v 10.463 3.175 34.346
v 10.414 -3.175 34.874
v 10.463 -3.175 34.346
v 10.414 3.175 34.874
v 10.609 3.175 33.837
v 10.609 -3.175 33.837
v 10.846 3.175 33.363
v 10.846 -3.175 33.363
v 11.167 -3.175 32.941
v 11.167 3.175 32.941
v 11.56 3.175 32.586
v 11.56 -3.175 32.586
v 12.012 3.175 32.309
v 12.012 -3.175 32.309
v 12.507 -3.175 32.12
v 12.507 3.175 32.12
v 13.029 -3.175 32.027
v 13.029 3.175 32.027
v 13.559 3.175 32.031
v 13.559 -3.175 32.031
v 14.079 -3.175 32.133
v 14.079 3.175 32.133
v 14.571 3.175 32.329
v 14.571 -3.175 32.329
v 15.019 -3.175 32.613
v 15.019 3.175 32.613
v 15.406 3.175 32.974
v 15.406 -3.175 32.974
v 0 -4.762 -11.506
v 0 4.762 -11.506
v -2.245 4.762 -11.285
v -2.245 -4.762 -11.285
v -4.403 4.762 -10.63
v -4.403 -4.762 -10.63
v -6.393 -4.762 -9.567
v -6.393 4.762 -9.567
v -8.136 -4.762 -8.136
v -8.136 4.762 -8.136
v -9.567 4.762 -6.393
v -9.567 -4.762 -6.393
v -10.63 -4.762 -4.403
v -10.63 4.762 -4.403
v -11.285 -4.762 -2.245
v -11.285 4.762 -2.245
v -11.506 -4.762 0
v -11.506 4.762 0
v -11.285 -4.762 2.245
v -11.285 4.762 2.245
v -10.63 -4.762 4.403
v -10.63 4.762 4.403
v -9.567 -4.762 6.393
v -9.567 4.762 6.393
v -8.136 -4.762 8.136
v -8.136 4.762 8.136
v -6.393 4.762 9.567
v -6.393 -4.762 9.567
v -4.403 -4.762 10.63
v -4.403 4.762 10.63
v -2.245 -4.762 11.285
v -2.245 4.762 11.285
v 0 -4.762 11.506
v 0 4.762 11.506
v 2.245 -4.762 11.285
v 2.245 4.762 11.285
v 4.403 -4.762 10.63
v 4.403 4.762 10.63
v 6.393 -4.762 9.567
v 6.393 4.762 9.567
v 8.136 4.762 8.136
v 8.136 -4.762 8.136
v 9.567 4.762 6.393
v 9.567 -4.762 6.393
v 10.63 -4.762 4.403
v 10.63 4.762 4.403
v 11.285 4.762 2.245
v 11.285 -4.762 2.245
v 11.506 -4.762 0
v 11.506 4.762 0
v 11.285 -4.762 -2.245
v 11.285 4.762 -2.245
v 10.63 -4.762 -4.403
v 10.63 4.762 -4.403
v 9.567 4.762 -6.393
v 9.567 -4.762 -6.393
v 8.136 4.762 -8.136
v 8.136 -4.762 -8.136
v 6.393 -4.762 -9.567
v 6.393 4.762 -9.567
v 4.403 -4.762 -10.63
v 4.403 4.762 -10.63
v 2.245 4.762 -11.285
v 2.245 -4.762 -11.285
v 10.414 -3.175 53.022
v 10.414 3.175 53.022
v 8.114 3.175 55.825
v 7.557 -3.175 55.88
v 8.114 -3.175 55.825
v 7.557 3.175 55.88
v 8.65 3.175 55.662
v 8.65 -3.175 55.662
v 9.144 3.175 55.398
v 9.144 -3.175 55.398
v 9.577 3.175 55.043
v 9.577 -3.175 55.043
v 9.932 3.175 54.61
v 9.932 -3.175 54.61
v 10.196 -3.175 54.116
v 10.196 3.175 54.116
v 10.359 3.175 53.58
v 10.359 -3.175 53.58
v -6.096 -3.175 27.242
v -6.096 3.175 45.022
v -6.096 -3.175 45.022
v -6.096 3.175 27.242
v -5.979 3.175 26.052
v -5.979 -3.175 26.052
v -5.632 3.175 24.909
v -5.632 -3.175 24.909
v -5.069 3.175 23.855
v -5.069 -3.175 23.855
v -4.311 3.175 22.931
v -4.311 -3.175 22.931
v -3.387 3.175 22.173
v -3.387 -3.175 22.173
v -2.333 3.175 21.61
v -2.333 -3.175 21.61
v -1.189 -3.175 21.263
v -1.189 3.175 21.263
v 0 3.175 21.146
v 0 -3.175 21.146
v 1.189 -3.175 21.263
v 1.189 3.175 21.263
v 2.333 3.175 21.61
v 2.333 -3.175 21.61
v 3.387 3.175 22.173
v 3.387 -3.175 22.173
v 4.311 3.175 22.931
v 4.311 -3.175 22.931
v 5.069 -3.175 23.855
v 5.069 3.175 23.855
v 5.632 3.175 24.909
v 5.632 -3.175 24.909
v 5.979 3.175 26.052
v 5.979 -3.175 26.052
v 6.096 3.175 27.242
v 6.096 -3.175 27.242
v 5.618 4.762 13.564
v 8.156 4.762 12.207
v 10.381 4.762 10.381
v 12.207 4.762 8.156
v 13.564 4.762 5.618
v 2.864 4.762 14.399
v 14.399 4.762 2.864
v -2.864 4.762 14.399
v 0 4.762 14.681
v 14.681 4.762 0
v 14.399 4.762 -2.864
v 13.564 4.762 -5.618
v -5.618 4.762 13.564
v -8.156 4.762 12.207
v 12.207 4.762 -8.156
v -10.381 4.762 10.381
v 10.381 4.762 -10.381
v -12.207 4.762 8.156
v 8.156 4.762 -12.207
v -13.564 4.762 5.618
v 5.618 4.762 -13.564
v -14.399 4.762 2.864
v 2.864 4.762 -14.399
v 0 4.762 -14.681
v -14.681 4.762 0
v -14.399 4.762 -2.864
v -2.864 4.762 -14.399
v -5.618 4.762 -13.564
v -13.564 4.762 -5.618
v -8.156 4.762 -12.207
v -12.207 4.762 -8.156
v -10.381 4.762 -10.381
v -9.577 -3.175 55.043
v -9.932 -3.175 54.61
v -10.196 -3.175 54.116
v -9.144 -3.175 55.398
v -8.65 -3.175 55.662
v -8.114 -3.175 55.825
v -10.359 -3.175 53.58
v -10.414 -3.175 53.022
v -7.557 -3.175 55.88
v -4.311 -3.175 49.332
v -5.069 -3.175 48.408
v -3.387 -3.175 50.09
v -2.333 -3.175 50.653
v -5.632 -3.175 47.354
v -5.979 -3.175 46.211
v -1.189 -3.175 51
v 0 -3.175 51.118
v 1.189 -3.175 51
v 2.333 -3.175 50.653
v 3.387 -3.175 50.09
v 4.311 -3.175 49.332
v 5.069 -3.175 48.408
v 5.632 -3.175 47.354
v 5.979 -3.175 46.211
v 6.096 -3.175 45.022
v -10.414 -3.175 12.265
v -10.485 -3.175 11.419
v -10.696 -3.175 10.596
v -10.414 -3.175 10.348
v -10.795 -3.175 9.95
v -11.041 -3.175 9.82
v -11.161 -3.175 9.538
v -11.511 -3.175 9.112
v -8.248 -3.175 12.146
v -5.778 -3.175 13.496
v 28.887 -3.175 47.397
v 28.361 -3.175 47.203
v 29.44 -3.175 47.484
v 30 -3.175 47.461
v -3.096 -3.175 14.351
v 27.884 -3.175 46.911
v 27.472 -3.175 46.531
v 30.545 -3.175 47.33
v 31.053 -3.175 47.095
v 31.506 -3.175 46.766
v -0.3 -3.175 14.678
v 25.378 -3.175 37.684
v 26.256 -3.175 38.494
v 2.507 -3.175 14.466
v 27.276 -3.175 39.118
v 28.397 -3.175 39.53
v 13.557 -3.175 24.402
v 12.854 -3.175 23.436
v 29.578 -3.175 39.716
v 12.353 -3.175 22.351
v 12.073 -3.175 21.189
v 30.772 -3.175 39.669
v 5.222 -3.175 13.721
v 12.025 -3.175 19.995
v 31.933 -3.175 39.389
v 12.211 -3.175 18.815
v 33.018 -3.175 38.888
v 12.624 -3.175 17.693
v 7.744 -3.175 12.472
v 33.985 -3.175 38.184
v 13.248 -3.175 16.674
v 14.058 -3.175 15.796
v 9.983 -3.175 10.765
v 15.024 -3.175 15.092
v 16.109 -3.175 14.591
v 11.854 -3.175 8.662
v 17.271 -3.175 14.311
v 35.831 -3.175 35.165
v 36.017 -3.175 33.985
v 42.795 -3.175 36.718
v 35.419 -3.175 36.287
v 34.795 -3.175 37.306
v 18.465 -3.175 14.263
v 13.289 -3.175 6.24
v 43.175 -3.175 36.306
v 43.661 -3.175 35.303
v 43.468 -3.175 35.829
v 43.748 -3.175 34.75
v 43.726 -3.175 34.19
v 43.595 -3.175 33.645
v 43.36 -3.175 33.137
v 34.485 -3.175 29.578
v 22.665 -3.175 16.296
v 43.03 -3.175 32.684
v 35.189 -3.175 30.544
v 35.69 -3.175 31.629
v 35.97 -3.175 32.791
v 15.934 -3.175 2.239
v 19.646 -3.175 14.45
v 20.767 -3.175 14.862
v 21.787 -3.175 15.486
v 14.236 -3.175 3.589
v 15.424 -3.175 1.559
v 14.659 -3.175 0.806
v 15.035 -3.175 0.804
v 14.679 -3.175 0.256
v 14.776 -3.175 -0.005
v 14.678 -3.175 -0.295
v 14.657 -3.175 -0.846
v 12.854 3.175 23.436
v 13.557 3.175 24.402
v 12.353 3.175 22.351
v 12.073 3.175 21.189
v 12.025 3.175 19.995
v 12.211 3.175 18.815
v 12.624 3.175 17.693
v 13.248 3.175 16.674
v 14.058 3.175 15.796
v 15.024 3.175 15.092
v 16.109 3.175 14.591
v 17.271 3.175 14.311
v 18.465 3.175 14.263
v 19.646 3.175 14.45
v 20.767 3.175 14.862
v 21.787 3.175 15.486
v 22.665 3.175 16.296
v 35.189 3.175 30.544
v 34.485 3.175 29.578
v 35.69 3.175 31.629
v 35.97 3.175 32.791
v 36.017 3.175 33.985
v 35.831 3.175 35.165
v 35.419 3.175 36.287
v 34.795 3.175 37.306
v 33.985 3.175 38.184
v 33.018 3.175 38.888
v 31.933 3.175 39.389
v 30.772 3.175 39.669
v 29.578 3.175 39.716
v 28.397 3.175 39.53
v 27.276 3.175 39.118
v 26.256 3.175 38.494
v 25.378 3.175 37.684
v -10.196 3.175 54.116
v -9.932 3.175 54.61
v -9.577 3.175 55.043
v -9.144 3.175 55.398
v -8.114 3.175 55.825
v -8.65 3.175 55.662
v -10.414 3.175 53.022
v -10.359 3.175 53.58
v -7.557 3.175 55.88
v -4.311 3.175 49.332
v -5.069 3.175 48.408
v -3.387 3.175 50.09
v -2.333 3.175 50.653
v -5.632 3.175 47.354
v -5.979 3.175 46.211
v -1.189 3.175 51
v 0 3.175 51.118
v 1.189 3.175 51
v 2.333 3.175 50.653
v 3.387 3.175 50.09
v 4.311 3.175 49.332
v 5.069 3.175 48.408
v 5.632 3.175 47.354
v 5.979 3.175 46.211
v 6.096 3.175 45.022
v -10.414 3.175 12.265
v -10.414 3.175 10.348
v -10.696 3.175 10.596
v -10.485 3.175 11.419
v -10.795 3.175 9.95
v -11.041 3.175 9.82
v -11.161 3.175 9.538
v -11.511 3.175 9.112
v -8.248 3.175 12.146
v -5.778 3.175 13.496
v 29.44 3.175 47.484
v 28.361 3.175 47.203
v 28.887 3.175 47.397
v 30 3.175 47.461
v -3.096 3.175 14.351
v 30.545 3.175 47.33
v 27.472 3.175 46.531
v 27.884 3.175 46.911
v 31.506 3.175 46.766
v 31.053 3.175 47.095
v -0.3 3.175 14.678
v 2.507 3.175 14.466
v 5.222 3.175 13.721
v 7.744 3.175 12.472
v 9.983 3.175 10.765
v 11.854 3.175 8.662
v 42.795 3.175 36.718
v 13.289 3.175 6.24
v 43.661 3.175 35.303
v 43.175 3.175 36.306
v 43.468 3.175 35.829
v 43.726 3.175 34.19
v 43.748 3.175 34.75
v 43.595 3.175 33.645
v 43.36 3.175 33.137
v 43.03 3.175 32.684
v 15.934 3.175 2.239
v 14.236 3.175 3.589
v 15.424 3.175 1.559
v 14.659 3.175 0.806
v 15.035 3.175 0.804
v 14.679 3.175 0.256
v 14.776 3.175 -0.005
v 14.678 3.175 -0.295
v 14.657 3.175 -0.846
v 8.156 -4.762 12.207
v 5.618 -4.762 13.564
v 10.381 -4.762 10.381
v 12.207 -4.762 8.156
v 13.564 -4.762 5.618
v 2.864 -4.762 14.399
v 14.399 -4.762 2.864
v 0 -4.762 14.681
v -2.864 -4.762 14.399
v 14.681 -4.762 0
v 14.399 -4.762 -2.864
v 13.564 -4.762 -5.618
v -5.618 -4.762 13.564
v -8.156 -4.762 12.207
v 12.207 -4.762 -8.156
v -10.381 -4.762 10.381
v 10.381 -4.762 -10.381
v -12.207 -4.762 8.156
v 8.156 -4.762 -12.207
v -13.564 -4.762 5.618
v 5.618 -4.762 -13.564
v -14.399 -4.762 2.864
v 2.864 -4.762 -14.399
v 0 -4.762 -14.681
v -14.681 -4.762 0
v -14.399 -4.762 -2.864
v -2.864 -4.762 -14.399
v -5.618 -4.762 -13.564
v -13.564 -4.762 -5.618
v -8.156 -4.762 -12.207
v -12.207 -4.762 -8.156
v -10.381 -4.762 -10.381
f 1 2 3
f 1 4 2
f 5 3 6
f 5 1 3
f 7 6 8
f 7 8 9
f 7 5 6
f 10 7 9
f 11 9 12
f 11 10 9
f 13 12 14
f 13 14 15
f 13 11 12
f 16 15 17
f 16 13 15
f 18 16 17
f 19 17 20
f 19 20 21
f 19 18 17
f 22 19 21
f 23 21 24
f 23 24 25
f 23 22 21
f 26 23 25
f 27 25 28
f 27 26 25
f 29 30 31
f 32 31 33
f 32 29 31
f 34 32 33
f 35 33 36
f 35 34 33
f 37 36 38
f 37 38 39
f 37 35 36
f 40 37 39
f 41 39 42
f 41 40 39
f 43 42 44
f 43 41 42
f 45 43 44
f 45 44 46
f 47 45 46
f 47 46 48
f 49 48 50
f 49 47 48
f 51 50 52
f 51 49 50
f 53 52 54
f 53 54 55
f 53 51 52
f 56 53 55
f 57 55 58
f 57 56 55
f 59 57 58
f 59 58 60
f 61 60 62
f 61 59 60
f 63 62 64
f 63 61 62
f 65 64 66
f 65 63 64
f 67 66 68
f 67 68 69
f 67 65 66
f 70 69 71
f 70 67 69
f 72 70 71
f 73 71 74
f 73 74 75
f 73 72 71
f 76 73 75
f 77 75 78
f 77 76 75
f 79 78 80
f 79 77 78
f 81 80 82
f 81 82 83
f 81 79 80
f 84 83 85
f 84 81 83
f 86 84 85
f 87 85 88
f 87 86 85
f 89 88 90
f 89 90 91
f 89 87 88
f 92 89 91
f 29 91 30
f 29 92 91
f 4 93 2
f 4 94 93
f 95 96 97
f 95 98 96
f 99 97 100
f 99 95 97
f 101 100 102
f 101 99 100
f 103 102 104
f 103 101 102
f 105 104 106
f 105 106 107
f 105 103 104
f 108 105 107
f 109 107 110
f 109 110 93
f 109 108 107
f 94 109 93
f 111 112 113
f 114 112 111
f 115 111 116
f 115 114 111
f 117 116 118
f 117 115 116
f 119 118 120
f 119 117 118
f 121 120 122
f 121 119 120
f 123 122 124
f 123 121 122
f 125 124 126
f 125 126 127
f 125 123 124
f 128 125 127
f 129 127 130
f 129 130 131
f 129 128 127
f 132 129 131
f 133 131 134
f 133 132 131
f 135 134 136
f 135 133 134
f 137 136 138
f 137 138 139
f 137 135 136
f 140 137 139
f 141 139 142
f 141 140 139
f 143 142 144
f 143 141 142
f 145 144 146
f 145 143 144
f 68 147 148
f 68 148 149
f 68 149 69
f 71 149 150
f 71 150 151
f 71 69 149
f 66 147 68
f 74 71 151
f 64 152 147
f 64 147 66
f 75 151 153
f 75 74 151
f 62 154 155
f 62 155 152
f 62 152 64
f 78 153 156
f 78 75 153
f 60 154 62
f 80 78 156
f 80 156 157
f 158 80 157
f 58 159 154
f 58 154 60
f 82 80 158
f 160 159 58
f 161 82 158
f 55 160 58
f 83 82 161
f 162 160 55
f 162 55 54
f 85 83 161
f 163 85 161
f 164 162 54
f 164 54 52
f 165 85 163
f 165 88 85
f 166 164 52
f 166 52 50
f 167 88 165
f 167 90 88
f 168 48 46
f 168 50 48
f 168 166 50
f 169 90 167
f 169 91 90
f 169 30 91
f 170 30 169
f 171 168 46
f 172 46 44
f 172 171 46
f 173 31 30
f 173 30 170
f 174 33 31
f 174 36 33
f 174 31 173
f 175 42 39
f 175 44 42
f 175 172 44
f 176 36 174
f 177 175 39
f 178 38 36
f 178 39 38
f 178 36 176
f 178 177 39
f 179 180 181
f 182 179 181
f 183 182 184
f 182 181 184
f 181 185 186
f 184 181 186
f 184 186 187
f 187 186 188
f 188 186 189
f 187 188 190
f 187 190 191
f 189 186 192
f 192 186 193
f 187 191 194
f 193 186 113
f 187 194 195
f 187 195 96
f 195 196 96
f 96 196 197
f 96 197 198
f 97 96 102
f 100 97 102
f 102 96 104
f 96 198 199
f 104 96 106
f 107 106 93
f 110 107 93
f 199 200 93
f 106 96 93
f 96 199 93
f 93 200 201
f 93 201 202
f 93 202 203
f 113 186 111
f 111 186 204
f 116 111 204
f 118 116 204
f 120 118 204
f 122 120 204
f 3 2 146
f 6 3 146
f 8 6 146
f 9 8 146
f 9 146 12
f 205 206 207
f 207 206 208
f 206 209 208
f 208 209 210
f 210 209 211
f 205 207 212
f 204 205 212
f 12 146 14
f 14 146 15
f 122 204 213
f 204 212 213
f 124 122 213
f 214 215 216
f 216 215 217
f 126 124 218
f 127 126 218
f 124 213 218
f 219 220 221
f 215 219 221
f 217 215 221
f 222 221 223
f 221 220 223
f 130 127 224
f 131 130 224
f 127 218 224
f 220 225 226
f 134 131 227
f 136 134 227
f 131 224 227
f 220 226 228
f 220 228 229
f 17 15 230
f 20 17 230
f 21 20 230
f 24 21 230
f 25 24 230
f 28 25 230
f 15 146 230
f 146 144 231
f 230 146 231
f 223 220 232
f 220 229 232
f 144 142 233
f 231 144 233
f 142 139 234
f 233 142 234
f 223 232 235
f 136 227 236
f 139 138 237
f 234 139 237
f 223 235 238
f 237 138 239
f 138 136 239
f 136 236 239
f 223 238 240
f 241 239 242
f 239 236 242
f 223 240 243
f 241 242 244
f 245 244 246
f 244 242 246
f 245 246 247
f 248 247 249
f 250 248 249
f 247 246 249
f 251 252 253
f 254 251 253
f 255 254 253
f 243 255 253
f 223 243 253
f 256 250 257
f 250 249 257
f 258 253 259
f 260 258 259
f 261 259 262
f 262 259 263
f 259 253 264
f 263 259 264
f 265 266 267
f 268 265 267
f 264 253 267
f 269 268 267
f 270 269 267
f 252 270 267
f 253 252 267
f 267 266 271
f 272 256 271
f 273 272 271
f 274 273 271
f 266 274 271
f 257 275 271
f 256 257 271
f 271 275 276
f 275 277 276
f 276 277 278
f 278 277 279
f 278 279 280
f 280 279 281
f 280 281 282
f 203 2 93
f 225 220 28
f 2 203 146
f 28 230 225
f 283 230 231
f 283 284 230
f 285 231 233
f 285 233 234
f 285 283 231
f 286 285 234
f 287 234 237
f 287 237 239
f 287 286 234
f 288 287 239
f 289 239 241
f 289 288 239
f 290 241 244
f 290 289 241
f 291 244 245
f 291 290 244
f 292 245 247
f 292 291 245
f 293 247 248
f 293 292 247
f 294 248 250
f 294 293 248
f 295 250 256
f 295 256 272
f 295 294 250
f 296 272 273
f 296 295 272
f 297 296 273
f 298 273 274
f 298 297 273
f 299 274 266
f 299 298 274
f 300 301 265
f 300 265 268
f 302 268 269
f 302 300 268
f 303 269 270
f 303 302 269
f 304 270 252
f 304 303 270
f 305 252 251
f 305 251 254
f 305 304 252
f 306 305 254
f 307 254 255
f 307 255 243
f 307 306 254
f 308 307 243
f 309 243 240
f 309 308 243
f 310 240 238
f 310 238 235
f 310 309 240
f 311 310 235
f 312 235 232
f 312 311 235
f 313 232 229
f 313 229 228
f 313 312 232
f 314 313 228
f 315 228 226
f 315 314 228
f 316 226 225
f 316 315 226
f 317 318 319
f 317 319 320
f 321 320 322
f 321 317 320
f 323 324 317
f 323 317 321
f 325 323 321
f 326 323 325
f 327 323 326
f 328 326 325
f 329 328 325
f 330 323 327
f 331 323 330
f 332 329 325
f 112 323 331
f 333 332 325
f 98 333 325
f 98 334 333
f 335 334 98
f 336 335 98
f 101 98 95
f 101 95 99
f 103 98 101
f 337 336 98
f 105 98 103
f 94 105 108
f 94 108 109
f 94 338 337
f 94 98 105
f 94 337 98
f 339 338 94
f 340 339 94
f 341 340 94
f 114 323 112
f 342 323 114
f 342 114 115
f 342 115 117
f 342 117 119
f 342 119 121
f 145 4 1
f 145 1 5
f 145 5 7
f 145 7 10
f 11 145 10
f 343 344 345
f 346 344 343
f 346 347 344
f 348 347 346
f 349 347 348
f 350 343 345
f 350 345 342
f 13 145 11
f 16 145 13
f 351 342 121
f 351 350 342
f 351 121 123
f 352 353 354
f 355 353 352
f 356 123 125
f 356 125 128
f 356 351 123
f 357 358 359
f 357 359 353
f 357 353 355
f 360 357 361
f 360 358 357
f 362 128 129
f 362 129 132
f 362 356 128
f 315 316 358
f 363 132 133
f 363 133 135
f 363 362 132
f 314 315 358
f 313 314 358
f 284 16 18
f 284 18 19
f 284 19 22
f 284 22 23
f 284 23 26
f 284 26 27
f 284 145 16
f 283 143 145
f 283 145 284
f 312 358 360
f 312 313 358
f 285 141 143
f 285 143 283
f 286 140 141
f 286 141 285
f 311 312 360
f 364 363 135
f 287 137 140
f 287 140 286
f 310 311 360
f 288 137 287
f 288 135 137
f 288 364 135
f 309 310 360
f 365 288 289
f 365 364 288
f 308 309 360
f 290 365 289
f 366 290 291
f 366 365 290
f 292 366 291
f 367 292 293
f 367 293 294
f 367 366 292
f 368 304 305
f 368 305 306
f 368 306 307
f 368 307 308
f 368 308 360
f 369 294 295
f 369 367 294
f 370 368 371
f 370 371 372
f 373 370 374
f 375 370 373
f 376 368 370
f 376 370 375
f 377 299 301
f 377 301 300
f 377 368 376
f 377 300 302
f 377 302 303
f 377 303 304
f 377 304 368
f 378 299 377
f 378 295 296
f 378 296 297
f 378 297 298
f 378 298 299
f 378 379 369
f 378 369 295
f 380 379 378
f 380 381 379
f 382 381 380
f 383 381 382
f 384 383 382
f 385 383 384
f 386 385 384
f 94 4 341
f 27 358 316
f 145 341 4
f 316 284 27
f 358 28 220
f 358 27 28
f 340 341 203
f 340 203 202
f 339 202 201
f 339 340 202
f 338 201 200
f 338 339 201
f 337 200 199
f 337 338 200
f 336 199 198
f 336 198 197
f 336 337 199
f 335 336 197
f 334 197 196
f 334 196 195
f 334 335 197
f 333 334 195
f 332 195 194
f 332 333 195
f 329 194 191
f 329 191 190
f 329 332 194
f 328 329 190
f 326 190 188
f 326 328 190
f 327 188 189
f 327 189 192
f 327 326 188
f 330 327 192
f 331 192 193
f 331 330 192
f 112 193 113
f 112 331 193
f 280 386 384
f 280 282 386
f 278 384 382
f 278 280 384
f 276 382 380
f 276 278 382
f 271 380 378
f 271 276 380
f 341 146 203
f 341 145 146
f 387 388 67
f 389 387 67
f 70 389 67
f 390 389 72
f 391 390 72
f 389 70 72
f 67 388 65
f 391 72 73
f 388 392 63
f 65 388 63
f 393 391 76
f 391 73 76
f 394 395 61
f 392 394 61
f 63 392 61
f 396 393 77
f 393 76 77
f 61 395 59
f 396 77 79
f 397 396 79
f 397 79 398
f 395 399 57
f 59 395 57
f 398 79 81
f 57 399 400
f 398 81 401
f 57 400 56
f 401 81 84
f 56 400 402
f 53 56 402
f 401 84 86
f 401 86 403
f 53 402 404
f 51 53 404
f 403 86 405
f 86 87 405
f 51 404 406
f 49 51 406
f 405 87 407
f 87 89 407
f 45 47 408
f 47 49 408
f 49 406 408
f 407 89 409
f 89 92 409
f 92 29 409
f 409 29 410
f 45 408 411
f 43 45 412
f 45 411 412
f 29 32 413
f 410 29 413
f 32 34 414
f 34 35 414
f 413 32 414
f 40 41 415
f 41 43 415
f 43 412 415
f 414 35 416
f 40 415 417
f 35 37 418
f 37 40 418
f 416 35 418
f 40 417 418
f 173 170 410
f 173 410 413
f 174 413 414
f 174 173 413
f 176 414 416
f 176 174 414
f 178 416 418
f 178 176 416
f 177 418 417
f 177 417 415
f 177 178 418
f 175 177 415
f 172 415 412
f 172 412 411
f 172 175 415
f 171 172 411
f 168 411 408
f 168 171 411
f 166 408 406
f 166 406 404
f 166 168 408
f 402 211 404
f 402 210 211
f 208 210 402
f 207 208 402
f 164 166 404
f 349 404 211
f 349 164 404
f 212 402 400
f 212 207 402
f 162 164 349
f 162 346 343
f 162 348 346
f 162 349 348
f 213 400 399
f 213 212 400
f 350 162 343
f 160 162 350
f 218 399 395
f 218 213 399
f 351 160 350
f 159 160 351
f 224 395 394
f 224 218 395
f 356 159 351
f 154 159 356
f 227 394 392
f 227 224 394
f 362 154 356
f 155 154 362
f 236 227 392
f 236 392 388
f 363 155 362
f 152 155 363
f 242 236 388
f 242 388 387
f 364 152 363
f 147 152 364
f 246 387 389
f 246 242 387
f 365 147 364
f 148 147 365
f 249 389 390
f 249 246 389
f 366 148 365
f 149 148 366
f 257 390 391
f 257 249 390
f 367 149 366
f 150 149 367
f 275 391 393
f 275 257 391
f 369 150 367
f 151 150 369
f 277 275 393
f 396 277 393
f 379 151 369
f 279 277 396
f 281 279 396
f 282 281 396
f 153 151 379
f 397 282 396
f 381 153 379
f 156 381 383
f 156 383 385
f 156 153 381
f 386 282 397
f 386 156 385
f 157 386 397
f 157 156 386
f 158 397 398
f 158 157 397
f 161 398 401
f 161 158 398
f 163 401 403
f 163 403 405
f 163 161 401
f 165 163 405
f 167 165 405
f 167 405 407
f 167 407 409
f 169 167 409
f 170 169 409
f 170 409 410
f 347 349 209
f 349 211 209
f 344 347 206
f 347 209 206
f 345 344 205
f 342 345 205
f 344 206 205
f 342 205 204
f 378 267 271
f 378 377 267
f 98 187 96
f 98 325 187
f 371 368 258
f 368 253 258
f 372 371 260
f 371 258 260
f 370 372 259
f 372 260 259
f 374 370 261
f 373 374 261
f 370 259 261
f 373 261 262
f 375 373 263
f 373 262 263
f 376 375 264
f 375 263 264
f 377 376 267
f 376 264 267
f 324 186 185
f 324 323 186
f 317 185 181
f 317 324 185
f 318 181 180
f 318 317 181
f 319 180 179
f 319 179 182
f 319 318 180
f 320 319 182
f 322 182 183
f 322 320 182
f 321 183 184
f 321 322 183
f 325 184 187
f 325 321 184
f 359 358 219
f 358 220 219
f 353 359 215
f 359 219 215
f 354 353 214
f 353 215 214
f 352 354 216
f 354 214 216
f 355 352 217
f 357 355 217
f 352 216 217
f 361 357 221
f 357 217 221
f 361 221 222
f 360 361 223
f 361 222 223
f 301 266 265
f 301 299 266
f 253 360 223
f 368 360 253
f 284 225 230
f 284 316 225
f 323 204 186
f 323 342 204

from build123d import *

# Parameters (mm, degrees)
SKETCH1_R                      = 14.6812
SKETCH1_R_2                    = 11.5062
BEARING_INSERT_EXTRUDE_DEPTH   = 4.7625
APEX_SLOT_INSERT_EXTRUDE_DEPTH = 3.175
FILLET1_R                      = 5.08
FILLET2_R                      = 2.8575


with BuildPart() as part:
    # Sketch1 → Bearing_Insert_Extrude (new, symmetric)
    with BuildSketch(Plane(origin=(0, 0, 0), x_dir=(1, 0, 0), z_dir=(0, 1, 0))):
        with Locations(Location((0, 0, 0), (0, 0, 90))):
            Circle(SKETCH1_R)
        with Locations(Location((0, 0, 0), (0, 0, 90))):
            Circle(SKETCH1_R_2, mode=Mode.SUBTRACT)
    extrude(amount=BEARING_INSERT_EXTRUDE_DEPTH, both=True)

    # Sketch1<4> → Apex_Slot_Insert_Extrude (add, symmetric)
    with BuildSketch(Plane(origin=(0, 0, 0), x_dir=(1, 0, 0), z_dir=(0, 1, 0))):
        with BuildLine():
            Line((-10.414, -10.348248037), (-10.414, -55.88))
            Line((-10.414, -55.88), (10.414, -55.88))
            Line((10.414, -55.88), (10.414, -27.365061948))
            Line((10.414, -27.365061948), (29.371655227, -48.665507962))
            Line((29.371655227, -48.665507962), (44.930015858, -34.818378351))
            Line((44.930015858, -34.818378351), (14.659031085, -0.806499284))
            ThreePointArc((14.659031085, -0.806499284), (5.221715671, -13.721199616), (-10.414, -10.348248037))
        make_face()
        with BuildLine():
            ThreePointArc((6.096, -45.0215), (0, -51.1175), (-6.096, -45.0215))
            Line((-6.096, -45.0215), (-6.096, -27.2415))
            ThreePointArc((-6.096, -27.2415), (0, -21.1455), (6.096, -27.2415))
            Line((6.096, -27.2415), (6.096, -45.0215))
        make_face(mode=Mode.SUBTRACT)
        with BuildLine():
            ThreePointArc((34.485419253, -29.577906234), (33.98457115, -38.184391183), (25.378086201, -37.68354308))
            Line((25.378086201, -37.68354308), (13.557365801, -24.402015712))
            ThreePointArc((13.557365801, -24.402015712), (14.058213904, -15.795530763), (22.664698853, -16.296378866))
            Line((22.664698853, -16.296378866), (34.485419253, -29.577906234))
        make_face(mode=Mode.SUBTRACT)
    extrude(amount=APEX_SLOT_INSERT_EXTRUDE_DEPTH, both=True)

    # Fillet1
    fillet1_edges = [part.edges().sort_by_distance(p)[0] for p in [
        (14.659031085, 0, 0.806499284),
        (-10.414, 0, 10.348248037),
    ]]
    fillet(fillet1_edges, radius=FILLET1_R)

    # Fillet2
    fillet2_edges = [part.edges().sort_by_distance(p)[0] for p in [
        (-10.414, 0, 55.88),
        (10.414, 0, 55.88),
        (10.414, 0, 27.365061948),
        (29.371655227, 0, 48.665507962),
        (44.930015858, 0, 34.818378351),
    ]]
    fillet(fillet2_edges, radius=FILLET2_R)


solid = part.part
